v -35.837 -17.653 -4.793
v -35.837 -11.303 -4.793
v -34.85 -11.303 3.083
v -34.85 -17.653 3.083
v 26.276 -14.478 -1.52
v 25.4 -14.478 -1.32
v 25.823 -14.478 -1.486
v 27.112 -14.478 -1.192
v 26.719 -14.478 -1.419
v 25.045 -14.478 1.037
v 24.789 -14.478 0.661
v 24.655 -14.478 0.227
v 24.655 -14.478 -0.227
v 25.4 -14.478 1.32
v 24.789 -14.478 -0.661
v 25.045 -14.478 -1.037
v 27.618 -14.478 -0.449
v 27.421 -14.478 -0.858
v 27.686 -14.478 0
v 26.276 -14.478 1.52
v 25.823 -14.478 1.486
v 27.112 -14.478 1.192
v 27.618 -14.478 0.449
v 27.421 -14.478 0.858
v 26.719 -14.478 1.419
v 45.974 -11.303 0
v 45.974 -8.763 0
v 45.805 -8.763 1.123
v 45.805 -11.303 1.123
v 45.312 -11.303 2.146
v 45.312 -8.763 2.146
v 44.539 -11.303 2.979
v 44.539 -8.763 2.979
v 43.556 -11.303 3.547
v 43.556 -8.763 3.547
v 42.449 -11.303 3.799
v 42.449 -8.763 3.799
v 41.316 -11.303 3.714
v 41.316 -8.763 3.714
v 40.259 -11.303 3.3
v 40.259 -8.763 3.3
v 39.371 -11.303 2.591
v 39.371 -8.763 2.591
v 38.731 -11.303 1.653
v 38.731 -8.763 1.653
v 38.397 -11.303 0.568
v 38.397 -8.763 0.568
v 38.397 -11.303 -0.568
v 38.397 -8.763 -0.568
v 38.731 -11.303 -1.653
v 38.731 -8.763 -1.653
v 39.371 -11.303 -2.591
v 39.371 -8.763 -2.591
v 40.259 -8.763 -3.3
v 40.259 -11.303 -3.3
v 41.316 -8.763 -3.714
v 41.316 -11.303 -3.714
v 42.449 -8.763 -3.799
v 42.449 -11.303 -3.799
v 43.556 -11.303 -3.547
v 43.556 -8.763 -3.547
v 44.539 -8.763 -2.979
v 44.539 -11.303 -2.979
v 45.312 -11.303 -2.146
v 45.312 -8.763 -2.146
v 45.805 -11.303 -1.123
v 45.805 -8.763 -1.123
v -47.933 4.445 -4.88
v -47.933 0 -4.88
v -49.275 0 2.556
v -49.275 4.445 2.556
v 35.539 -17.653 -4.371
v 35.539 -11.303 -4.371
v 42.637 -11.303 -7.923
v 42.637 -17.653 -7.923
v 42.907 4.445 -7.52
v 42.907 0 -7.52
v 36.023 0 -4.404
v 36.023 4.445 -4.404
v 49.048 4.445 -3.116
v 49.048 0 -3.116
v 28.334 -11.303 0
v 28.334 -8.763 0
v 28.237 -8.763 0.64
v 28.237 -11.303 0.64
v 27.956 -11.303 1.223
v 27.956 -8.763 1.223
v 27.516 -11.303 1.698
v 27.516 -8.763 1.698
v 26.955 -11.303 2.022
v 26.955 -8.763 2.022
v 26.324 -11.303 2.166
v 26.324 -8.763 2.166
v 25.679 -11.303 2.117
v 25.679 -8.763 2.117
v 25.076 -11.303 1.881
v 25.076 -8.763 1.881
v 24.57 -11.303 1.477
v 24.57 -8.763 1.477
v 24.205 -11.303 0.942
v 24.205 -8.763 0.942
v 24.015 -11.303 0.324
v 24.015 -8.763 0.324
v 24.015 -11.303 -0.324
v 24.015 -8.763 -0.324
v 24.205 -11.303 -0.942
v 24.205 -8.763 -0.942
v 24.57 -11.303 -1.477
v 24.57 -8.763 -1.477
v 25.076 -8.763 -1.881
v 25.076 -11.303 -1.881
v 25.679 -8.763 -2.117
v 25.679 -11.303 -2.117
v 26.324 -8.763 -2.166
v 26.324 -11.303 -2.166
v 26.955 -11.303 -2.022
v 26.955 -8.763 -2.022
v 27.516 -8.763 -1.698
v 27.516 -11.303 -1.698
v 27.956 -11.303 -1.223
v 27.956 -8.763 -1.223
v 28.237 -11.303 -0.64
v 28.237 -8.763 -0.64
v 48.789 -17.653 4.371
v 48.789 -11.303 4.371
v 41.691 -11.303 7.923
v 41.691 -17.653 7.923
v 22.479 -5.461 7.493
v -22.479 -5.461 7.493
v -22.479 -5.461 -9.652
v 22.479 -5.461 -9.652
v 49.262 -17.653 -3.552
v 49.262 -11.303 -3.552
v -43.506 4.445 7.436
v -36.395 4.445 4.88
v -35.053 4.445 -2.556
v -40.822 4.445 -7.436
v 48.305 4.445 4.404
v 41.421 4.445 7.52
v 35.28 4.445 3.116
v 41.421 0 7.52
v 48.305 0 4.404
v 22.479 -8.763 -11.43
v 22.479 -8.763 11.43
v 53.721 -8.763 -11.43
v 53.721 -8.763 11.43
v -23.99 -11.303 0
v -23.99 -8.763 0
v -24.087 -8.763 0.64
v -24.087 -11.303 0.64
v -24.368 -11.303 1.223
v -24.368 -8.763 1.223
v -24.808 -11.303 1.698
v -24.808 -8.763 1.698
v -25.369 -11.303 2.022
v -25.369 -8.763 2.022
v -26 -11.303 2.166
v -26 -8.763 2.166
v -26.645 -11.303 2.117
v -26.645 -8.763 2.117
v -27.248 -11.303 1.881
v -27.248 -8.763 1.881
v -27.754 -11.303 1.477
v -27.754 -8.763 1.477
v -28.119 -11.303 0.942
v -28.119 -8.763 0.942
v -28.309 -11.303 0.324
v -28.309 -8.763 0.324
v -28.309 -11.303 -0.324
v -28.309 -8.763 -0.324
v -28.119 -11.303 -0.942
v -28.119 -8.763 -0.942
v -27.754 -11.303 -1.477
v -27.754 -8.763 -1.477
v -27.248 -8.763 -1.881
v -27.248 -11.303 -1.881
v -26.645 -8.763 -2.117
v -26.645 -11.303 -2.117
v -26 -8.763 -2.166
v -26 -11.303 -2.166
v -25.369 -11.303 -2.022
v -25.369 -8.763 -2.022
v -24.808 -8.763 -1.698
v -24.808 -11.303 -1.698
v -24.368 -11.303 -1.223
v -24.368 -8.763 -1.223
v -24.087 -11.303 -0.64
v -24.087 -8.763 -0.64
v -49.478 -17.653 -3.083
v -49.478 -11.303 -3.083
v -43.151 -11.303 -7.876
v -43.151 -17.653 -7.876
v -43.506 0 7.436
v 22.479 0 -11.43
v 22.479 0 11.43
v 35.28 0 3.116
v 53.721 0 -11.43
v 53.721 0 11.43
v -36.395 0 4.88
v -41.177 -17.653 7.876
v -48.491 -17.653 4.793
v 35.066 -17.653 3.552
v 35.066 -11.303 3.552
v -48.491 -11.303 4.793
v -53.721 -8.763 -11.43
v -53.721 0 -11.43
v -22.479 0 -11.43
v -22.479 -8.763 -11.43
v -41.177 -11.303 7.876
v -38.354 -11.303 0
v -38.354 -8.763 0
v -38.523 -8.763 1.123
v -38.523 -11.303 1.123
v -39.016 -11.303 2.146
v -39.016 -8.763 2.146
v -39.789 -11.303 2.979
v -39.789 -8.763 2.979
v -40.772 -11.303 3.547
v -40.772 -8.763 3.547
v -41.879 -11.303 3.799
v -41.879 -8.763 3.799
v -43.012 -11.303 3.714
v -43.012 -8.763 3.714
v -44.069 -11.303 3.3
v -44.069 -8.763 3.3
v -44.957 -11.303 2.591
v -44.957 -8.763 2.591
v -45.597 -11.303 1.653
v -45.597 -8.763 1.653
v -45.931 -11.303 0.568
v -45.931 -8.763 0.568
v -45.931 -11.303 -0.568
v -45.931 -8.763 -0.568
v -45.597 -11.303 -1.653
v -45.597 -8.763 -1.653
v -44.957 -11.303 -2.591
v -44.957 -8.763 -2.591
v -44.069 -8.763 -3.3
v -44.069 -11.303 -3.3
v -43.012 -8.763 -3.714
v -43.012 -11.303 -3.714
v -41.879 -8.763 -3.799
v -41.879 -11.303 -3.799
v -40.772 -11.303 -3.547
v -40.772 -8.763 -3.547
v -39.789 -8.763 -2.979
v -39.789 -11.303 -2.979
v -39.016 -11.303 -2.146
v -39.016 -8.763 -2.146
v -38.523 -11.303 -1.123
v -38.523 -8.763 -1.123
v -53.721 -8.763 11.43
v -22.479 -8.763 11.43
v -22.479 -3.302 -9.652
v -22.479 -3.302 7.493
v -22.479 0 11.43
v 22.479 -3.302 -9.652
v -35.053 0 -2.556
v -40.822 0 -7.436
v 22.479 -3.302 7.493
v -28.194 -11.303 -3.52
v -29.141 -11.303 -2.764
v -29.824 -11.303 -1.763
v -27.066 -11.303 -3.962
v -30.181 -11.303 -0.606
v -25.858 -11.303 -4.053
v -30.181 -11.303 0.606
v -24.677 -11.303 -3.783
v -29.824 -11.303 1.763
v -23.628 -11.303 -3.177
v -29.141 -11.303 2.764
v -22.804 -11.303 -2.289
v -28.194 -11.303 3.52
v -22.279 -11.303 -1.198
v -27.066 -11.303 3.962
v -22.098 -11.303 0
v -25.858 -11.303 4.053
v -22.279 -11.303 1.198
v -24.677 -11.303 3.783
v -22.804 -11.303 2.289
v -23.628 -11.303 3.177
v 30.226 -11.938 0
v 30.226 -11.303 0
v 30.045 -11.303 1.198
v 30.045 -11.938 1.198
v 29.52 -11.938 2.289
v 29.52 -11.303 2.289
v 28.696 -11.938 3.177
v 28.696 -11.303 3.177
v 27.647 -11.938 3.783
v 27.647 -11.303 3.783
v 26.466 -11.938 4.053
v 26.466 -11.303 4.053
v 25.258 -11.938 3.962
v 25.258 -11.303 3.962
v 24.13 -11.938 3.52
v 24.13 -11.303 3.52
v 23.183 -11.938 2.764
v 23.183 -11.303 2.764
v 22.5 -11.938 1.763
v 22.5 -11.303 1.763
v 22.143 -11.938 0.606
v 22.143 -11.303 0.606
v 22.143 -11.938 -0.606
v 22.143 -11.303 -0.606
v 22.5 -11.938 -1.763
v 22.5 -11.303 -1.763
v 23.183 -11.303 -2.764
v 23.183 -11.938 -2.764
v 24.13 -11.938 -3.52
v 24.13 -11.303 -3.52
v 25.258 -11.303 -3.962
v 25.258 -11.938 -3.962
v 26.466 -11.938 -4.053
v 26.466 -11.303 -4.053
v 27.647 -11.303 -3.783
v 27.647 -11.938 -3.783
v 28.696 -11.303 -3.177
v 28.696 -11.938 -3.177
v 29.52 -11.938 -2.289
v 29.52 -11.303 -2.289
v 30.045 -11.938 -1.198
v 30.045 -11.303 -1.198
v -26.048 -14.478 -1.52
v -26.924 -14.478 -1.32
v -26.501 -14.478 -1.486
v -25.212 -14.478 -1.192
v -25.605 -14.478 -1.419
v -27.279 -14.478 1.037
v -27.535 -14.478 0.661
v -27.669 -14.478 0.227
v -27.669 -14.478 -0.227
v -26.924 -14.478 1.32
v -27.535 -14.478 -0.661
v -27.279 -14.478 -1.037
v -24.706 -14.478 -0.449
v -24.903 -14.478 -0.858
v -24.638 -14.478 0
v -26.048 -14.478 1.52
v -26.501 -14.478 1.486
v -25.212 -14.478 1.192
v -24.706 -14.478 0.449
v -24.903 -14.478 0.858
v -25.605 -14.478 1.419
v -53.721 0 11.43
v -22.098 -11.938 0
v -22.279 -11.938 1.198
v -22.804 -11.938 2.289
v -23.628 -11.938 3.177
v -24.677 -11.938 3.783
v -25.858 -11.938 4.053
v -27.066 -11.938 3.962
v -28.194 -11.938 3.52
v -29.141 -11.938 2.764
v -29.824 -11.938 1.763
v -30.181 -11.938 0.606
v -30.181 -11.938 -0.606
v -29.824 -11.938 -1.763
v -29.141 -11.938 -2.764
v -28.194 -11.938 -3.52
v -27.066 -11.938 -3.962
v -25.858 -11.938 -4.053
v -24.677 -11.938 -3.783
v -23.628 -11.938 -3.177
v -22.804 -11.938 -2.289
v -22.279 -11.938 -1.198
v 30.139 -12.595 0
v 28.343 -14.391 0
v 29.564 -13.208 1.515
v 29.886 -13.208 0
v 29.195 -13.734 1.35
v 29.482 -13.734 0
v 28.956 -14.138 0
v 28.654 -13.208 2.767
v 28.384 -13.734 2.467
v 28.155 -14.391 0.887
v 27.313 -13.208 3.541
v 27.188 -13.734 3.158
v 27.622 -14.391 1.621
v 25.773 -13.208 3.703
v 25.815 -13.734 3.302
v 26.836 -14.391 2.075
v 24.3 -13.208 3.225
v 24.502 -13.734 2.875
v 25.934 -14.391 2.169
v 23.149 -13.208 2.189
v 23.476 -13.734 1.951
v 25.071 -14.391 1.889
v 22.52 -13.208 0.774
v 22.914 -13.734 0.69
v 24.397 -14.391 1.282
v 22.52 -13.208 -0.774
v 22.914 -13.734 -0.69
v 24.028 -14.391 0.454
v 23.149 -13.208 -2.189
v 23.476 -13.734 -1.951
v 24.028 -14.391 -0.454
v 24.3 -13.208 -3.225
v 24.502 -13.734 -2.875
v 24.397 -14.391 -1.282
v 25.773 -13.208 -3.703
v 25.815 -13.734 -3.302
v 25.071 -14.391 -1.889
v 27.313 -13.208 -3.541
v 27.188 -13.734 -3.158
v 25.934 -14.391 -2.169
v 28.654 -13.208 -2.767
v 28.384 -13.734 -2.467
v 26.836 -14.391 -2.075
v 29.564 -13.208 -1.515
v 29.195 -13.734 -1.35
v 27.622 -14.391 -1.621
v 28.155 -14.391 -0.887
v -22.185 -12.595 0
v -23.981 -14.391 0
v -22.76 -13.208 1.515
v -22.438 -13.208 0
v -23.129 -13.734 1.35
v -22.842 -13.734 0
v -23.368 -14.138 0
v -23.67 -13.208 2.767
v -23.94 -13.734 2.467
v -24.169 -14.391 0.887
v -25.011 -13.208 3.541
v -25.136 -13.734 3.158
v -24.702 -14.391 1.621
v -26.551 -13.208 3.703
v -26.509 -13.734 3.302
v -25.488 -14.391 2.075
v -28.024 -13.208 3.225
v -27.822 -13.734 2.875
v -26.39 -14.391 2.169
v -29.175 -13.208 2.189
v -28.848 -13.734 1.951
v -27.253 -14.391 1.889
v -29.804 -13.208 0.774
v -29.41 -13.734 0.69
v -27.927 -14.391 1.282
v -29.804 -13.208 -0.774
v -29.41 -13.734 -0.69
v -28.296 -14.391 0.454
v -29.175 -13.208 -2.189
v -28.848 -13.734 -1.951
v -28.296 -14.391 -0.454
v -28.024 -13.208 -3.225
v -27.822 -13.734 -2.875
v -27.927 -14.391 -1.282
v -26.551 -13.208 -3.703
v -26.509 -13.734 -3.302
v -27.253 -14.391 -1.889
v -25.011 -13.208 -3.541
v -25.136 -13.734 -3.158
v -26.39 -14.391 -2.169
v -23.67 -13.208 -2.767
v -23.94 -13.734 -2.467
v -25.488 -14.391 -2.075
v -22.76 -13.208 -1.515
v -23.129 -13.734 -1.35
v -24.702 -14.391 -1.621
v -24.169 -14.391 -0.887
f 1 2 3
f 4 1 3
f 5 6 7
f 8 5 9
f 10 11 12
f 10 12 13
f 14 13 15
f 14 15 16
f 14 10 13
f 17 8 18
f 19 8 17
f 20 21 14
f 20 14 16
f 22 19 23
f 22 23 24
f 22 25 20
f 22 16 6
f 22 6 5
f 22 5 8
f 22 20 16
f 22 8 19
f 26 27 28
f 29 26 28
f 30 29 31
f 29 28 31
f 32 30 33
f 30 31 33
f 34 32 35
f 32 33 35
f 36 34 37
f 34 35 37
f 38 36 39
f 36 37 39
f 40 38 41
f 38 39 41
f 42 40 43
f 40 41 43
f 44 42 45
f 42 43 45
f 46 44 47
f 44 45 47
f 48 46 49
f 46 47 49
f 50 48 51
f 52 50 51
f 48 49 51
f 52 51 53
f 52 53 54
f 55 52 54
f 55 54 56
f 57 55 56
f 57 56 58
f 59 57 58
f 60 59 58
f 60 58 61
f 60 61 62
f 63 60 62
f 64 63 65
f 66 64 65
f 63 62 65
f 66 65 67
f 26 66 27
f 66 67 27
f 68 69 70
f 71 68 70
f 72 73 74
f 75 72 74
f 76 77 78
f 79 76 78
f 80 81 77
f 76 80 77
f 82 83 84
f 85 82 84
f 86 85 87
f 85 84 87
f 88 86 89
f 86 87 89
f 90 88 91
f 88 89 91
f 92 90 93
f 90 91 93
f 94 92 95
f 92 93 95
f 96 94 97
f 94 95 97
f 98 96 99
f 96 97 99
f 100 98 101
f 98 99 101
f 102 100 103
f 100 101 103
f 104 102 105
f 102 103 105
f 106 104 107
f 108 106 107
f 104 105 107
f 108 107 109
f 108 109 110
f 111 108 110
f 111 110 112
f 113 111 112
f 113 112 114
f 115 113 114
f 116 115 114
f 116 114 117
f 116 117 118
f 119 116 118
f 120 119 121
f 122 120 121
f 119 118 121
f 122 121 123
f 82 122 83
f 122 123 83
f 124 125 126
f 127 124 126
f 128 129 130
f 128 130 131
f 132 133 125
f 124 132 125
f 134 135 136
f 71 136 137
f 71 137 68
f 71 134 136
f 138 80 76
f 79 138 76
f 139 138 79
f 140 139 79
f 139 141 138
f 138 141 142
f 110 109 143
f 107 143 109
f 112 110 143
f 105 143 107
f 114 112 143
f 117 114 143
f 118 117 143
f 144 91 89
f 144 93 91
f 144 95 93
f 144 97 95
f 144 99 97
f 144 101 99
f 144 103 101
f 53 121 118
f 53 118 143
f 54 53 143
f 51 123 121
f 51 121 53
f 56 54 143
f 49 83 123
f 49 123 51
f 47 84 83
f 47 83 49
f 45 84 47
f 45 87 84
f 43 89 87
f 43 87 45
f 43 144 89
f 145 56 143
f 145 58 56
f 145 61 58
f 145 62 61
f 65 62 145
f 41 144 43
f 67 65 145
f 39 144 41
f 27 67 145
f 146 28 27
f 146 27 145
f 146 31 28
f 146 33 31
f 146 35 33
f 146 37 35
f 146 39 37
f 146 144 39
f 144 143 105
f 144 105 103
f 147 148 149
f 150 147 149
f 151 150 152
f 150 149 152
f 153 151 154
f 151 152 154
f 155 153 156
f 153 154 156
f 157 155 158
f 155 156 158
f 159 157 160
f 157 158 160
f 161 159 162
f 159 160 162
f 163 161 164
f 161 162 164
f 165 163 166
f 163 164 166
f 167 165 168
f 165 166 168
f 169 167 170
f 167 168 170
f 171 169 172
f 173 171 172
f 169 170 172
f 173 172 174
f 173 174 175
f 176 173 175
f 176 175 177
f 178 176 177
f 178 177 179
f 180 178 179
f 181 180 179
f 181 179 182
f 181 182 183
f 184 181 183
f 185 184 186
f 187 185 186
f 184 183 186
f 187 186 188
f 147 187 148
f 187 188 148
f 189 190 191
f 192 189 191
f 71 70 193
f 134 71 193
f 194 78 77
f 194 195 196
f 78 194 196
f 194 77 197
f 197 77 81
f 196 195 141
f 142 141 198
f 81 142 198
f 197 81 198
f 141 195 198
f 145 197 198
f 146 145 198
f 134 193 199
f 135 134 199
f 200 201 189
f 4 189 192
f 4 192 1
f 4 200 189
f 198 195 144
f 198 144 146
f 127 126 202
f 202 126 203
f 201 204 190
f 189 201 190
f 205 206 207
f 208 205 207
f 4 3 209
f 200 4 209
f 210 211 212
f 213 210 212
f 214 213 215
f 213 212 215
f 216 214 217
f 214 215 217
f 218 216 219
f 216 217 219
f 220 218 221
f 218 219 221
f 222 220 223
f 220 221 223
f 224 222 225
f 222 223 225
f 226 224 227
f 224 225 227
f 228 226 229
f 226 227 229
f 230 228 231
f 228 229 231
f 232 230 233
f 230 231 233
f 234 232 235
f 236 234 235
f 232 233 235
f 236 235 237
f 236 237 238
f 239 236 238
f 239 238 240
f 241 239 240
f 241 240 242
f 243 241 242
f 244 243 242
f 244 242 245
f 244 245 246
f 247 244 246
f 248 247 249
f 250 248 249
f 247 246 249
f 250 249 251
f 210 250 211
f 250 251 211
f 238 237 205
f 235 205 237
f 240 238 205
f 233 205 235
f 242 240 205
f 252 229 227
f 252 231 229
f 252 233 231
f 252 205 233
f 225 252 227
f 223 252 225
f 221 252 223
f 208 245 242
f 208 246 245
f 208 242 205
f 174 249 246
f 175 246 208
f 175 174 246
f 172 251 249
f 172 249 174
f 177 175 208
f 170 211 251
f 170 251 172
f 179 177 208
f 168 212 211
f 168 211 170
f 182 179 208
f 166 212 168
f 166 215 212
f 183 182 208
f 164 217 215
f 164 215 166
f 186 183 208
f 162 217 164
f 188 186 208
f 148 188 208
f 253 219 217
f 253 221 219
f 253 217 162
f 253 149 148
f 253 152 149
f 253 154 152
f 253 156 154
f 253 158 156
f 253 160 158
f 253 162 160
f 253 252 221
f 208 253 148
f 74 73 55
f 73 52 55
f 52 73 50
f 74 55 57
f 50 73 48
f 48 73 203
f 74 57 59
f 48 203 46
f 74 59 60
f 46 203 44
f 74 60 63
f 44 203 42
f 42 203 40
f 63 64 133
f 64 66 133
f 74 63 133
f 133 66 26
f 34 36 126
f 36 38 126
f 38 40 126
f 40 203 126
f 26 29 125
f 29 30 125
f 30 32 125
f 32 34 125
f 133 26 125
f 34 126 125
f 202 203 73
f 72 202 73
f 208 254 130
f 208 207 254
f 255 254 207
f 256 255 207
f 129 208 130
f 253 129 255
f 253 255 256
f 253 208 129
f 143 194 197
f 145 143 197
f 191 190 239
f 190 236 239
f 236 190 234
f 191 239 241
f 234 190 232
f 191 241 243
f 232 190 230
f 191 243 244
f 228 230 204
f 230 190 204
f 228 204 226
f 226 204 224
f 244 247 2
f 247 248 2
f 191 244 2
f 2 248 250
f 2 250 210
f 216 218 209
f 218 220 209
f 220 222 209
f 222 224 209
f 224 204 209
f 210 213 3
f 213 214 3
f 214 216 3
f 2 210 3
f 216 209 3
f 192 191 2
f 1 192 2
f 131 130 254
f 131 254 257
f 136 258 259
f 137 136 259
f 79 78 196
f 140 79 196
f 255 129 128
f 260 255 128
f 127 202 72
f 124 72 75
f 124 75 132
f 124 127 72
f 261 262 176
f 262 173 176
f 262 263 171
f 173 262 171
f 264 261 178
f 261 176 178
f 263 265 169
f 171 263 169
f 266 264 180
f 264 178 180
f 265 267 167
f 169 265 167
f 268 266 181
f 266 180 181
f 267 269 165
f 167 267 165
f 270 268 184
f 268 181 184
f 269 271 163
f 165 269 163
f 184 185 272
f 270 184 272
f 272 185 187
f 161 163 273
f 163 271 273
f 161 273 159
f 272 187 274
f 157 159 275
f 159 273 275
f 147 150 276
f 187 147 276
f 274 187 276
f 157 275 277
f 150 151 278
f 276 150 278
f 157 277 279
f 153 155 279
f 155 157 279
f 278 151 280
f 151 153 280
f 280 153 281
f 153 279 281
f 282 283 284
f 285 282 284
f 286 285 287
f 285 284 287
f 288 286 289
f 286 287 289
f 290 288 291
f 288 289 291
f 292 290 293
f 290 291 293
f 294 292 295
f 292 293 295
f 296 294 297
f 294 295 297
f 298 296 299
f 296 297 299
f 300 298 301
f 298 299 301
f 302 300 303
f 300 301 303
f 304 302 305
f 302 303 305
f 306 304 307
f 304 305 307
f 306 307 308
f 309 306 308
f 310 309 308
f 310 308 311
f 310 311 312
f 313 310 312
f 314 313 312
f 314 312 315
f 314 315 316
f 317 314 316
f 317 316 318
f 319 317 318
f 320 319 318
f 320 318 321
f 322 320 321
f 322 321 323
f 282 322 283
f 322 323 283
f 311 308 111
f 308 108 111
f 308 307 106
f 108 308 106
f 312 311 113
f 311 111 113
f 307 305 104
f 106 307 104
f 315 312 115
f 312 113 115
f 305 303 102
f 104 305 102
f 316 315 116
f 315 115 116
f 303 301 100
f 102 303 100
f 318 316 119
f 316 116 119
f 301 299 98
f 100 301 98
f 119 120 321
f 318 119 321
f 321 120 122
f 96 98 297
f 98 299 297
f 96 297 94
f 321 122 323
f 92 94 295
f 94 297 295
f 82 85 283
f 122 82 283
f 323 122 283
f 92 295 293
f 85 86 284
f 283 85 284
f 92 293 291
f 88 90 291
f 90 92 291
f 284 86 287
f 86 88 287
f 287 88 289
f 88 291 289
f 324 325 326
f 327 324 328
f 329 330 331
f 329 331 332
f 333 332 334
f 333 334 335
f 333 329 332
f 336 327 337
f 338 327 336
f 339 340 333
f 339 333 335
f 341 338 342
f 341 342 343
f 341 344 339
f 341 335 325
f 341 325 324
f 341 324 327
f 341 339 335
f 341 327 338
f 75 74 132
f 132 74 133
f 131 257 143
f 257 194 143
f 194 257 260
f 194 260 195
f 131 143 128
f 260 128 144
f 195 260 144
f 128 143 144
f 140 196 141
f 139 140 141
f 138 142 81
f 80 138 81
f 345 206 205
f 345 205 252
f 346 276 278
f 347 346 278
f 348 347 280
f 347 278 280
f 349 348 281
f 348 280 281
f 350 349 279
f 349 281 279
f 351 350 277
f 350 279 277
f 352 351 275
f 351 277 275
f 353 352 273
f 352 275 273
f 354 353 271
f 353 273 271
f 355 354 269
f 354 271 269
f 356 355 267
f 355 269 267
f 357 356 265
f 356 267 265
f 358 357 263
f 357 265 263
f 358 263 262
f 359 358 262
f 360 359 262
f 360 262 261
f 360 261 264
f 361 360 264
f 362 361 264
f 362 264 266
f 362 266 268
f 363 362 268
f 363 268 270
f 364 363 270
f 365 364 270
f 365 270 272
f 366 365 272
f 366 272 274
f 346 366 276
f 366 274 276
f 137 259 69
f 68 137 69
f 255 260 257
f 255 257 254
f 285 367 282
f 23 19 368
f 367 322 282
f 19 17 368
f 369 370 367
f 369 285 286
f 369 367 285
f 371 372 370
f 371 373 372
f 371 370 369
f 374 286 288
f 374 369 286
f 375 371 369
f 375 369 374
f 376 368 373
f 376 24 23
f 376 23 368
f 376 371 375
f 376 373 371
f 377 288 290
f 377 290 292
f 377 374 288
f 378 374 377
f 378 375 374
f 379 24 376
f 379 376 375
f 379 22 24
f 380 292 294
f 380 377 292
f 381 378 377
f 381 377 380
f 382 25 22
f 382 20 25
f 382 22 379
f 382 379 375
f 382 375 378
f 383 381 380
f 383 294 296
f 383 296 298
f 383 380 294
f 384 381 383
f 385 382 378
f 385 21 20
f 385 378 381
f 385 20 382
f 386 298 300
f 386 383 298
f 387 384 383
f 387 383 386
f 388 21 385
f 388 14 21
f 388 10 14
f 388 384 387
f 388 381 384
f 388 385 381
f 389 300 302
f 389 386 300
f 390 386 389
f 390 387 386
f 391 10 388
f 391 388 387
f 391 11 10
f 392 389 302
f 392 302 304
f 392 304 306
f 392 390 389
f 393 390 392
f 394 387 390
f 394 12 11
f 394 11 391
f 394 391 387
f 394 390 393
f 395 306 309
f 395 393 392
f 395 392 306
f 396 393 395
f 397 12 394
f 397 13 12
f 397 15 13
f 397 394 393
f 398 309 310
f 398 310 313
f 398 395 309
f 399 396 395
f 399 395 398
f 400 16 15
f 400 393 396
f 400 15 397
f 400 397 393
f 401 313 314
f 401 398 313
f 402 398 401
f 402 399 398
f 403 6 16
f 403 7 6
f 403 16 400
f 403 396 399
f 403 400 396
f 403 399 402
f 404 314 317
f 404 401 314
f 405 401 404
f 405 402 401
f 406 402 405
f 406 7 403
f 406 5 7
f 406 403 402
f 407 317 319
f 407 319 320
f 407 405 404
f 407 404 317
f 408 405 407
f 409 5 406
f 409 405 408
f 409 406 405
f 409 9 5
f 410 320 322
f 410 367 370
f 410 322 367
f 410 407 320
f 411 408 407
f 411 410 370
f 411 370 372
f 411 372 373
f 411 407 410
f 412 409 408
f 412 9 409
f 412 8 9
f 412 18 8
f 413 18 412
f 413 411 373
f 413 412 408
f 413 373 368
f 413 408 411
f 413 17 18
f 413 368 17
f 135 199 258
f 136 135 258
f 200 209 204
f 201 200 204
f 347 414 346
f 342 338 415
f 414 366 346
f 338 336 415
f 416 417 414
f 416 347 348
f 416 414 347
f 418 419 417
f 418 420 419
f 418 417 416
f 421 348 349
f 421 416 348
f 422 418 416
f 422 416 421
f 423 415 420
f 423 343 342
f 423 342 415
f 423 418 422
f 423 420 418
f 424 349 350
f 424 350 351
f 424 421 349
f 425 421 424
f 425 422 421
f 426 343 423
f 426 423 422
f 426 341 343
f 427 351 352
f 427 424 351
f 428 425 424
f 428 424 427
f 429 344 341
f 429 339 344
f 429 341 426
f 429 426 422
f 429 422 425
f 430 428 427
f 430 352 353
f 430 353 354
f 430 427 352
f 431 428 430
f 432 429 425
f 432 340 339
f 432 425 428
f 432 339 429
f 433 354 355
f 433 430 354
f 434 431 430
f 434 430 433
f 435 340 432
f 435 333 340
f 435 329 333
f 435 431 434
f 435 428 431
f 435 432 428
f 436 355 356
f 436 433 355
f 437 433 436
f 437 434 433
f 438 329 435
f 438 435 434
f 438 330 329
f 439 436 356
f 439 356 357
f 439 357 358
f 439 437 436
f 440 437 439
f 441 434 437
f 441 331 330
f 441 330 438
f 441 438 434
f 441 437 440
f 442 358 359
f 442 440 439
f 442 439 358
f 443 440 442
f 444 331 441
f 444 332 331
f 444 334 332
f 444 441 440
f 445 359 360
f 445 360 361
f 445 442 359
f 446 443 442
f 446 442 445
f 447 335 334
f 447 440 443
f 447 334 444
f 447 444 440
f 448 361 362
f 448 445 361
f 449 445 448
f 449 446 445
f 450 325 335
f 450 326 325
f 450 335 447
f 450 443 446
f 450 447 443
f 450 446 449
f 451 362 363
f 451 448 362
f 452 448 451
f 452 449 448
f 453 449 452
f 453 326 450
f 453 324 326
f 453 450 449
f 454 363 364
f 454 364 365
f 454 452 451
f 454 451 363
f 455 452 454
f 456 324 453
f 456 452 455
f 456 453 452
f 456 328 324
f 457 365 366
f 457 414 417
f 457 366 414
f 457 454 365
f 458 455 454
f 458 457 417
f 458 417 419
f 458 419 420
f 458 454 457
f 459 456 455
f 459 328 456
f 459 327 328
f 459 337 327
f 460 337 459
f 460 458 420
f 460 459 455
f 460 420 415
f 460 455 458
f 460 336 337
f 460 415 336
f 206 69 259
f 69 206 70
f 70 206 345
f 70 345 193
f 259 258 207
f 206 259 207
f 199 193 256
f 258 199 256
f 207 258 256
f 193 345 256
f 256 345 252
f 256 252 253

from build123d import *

# Parameters (mm, degrees)
F0_W      = 107.442
F0_H      = 22.86
F1_DEPTH  = 8.763
F2_W      = 44.958
F2_H      = 6.7985991507
F3_DEPTH  = 25.4
F4_W      = 44.958
F4_H      = 17.145
F5_DEPTH  = 3.302
F6_W      = 44.958
F6_H      = 17.145
F7_DEPTH  = 3.302
F8_R      = 2.1717
F8_R_2    = 3.81
F9_DEPTH  = 2.54
F10_R     = 4.064
F11_DEPTH = 3.175
F12_R     = 2.54
F14_DEPTH = 6.35
F16_DEPTH = 4.445


with BuildPart() as f1:
    # F0 (on Front) → F1 (new body)
    with BuildSketch(Plane.XZ):
        Rectangle(F0_W, F0_H)
    extrude(amount=F1_DEPTH)

    # F2 (on face) → F3 (cut)
    with BuildSketch(Plane.XZ.offset(8.763)):
        with Locations((0, 10.8926433936)):
            Rectangle(F2_W, F2_H)
        with Locations((0, -13.0509557571)):
            Rectangle(F2_W, F2_H)
    extrude(amount=-F3_DEPTH, mode=Mode.SUBTRACT)

    # F4 (on face) → F5 (cut)
    with BuildSketch(Plane.XZ.offset(8.763)):
        with Locations((0, -1.0791561817)):
            Rectangle(F4_W, F4_H)
    extrude(amount=-F5_DEPTH, mode=Mode.SUBTRACT)

    # F6 (on face) → F7 (cut)
    with BuildSketch(Plane(origin=(0, 0, 0), x_dir=(-1, 0, 0), z_dir=(0, 1, 0))):
        with Locations((0, -1.0791561817)):
            Rectangle(F6_W, F6_H)
    extrude(amount=-F7_DEPTH, mode=Mode.SUBTRACT)

    # F8 (on face) → F9 (join)
    with BuildSketch(Plane.XZ.offset(8.763)):
        with Locations((-26.162, 0)):
            Circle(F8_R)
        with Locations((26.162, 0)):
            Circle(F8_R)
        with Locations((42.164, 0)):
            Circle(F8_R_2)
        with Locations((-42.164, 0)):
            Circle(F8_R_2)
    extrude(amount=F9_DEPTH)

    # F10 (on face) → F11 (join)
    with BuildSketch(Plane.XZ.offset(11.303)):
        with Locations((-26.162, 0)):
            Circle(F10_R)
        with Locations((26.162, 0)):
            Circle(F10_R)
    extrude(amount=F11_DEPTH)

    # F12
    f12_edges = [f1.edges().sort_by_distance(p)[0] for p in [
        (-30.226, -14.478, 0),
        (22.098, -14.478, 0),
    ]]
    fillet(f12_edges, radius=F12_R)

    # F13 (on face) → F14 (join)
    with BuildSketch(Plane.XZ.offset(11.303)):
        Polygon((-34.8496852361, 3.0829702859), (-41.1767732048, 7.8758675398), (-48.4910879687, 4.7928972539), (-49.4783147639, -3.0829702859), (-43.1512267952, -7.8758675398), (-35.8369120313, -4.7928972539), align=None)
        Polygon((48.7893377385, 4.3713620418), (41.6909582919, 7.9233918111), (35.0656205534, 3.5520297693), (35.5386622615, -4.3713620418), (42.6370417081, -7.9233918111), (49.2623794466, -3.5520297693), align=None)
    extrude(amount=F14_DEPTH)

    # F15 (on face) → F16 (join)
    with BuildSketch(Plane(origin=(0, 0, 0), x_dir=(-1, 0, 0), z_dir=(0, 1, 0))):
        Polygon((-35.2800293387, 3.1163504593), (-41.4208533342, 7.5198687012), (-48.3048239954, 4.4035182419), (-49.0479706613, -3.1163504593), (-42.9071466658, -7.5198687012), (-36.0231760046, -4.4035182419), align=None)
        Polygon((49.2749888468, 2.5562726518), (43.5056973679, 7.4364333133), (36.3947085211, 4.8801606615), (35.0530111532, -2.5562726518), (40.8223026321, -7.4364333133), (47.9332914789, -4.8801606615), align=None)
    extrude(amount=F16_DEPTH)


solid = f1.part
